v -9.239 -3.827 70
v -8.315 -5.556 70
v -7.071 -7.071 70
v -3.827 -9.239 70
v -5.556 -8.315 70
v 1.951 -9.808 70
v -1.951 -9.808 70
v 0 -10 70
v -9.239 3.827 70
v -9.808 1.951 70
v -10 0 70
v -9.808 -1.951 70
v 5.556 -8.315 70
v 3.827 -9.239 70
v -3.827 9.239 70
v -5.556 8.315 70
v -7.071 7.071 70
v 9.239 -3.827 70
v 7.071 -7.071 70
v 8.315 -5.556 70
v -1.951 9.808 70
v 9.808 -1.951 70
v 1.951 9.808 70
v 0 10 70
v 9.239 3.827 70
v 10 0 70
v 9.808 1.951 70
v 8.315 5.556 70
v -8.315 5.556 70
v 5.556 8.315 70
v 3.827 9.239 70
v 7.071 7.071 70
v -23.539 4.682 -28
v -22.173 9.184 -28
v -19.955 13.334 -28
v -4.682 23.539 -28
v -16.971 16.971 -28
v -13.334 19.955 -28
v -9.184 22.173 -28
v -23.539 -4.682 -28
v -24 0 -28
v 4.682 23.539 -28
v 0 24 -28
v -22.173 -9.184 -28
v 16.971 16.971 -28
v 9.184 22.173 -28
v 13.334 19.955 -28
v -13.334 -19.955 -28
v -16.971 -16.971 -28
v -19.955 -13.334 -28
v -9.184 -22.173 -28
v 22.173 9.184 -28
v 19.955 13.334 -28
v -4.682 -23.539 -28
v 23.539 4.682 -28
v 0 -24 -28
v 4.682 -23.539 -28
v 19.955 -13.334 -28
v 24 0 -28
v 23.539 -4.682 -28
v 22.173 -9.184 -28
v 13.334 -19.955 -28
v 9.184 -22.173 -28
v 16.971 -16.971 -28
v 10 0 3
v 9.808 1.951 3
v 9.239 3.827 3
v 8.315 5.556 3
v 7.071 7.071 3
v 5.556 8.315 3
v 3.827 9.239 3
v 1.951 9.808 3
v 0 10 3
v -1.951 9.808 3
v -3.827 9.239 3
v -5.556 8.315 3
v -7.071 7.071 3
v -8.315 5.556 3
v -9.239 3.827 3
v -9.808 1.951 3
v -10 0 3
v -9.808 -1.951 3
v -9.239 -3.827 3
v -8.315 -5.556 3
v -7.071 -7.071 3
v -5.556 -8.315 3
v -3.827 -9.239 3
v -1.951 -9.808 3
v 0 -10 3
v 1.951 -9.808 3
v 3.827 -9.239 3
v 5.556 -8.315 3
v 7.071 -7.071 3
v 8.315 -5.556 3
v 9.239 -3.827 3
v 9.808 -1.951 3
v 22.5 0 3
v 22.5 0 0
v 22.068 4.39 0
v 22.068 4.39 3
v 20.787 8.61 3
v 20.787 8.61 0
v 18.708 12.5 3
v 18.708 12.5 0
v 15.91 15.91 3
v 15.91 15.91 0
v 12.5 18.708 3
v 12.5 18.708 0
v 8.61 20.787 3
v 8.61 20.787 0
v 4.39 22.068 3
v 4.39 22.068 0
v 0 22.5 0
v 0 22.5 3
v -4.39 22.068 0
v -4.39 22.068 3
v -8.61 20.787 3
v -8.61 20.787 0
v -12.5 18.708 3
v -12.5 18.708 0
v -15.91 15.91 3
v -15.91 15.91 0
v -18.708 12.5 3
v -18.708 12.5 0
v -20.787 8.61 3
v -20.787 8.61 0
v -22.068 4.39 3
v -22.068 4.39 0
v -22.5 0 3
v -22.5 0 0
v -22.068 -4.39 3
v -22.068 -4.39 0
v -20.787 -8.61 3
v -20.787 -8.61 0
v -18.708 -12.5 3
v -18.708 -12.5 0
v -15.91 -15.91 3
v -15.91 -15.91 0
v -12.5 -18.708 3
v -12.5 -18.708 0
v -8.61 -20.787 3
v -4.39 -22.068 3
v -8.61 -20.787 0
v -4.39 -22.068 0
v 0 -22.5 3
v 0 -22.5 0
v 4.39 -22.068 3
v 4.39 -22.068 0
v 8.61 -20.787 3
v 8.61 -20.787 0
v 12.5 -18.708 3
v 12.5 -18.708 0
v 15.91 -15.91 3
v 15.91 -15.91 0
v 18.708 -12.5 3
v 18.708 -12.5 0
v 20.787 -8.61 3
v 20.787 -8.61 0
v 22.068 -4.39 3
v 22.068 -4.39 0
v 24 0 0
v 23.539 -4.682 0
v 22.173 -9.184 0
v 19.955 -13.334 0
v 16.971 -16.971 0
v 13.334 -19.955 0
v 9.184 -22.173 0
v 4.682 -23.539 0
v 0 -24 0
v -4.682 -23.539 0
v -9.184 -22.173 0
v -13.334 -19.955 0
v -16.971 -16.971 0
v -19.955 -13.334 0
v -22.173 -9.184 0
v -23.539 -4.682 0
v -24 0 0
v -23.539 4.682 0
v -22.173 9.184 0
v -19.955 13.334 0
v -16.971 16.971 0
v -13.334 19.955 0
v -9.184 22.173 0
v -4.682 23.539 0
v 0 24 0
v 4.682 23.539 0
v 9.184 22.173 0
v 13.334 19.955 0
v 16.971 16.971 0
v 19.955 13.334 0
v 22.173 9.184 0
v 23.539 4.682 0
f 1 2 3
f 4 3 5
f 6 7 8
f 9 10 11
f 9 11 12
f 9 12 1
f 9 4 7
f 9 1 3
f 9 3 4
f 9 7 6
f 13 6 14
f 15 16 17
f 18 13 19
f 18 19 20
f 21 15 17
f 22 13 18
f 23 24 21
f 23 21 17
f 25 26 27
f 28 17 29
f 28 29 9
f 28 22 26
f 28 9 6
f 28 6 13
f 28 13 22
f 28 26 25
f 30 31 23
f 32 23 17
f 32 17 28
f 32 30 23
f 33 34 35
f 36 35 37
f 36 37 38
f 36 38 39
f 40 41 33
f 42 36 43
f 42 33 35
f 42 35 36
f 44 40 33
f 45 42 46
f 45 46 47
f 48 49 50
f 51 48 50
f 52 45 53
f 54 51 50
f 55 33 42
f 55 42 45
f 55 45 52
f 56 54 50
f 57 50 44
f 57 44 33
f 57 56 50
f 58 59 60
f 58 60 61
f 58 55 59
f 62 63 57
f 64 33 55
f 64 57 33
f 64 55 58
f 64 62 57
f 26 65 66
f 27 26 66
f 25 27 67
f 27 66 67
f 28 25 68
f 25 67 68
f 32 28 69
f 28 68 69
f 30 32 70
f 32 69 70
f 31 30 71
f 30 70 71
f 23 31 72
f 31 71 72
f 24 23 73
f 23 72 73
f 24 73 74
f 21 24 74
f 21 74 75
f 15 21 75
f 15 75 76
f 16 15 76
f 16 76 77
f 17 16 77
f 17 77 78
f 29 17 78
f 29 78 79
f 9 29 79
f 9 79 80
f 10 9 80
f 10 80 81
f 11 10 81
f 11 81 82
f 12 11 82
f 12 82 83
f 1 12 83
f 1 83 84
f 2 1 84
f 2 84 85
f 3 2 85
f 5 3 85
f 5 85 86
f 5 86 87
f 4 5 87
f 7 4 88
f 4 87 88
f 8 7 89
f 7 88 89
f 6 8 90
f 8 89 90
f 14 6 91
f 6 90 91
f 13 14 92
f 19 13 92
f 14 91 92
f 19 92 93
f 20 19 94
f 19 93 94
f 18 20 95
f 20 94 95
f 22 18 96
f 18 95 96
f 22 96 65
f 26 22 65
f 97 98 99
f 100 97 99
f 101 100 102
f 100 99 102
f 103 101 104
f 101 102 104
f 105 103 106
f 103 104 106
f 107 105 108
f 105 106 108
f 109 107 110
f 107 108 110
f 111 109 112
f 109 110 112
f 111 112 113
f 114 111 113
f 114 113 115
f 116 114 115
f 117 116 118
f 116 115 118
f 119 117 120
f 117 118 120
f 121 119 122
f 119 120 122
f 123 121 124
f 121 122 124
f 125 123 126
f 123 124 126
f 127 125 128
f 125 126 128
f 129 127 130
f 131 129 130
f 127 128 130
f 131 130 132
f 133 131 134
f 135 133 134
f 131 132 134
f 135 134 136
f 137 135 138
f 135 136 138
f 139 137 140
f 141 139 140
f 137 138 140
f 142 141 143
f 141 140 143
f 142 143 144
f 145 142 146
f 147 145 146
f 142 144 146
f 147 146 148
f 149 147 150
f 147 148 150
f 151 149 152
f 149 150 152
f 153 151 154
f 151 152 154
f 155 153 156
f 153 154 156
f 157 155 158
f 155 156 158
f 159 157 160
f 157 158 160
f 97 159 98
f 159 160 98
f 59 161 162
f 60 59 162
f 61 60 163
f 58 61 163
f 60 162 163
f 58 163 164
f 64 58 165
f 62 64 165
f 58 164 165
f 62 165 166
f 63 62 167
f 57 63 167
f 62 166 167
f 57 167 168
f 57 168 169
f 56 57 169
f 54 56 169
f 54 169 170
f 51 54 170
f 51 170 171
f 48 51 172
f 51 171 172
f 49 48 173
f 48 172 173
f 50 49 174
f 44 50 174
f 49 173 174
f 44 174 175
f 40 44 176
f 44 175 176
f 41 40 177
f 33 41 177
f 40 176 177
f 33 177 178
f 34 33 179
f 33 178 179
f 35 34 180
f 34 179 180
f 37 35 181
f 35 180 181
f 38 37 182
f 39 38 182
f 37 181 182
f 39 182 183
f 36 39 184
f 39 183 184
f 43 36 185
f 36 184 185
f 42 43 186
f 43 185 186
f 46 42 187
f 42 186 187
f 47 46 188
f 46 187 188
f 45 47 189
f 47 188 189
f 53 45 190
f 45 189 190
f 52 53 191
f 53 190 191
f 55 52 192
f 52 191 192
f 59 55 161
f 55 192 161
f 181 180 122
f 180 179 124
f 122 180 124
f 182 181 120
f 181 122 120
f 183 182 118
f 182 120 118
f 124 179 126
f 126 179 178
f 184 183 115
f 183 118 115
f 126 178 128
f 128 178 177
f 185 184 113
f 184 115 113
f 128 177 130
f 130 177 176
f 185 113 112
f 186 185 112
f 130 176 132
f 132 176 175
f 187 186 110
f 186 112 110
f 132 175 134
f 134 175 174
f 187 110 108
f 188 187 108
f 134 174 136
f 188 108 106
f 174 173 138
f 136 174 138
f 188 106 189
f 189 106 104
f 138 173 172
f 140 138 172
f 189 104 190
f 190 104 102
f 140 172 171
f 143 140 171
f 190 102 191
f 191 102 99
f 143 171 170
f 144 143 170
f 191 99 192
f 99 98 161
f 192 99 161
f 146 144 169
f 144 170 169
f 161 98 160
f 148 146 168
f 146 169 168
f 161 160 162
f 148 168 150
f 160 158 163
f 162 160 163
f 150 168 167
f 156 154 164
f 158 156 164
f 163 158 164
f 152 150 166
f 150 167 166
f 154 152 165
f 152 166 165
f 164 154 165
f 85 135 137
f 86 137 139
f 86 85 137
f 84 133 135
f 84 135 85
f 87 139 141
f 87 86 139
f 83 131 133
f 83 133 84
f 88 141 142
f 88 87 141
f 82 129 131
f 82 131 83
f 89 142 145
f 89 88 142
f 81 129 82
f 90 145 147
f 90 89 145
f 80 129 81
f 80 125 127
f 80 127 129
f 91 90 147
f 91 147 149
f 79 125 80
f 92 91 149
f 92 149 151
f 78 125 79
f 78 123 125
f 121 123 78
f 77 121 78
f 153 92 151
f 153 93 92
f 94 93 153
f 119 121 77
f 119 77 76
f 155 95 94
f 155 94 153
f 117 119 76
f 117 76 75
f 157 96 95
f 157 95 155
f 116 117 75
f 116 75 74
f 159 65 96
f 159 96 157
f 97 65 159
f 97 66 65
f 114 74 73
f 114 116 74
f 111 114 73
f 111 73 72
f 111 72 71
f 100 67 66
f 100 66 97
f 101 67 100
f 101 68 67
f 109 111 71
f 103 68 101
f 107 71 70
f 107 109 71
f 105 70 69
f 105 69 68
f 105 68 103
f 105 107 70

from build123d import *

# Parameters (mm, degrees)
F0_R     = 22.5
F1_DEPTH = 3
F2_R     = 10
F3_DEPTH = 70
F4_R     = 24
F5_DEPTH = 28


with BuildPart() as f1:
    # F0 (on Top) → F1 (new body)
    with BuildSketch(Plane.XY):
        Circle(F0_R)
    extrude(amount=F1_DEPTH)

    # F2 (on Top) → F3 (join)
    with BuildSketch(Plane.XY):
        Circle(F2_R)
    extrude(amount=F3_DEPTH)

    # F4 (on face) → F5 (join)
    with BuildSketch(Plane(origin=(0, 0, 0), x_dir=(1, 0, 0), z_dir=(0, 0, -1))):
        Circle(F4_R)
    extrude(amount=F5_DEPTH)


solid = f1.part
